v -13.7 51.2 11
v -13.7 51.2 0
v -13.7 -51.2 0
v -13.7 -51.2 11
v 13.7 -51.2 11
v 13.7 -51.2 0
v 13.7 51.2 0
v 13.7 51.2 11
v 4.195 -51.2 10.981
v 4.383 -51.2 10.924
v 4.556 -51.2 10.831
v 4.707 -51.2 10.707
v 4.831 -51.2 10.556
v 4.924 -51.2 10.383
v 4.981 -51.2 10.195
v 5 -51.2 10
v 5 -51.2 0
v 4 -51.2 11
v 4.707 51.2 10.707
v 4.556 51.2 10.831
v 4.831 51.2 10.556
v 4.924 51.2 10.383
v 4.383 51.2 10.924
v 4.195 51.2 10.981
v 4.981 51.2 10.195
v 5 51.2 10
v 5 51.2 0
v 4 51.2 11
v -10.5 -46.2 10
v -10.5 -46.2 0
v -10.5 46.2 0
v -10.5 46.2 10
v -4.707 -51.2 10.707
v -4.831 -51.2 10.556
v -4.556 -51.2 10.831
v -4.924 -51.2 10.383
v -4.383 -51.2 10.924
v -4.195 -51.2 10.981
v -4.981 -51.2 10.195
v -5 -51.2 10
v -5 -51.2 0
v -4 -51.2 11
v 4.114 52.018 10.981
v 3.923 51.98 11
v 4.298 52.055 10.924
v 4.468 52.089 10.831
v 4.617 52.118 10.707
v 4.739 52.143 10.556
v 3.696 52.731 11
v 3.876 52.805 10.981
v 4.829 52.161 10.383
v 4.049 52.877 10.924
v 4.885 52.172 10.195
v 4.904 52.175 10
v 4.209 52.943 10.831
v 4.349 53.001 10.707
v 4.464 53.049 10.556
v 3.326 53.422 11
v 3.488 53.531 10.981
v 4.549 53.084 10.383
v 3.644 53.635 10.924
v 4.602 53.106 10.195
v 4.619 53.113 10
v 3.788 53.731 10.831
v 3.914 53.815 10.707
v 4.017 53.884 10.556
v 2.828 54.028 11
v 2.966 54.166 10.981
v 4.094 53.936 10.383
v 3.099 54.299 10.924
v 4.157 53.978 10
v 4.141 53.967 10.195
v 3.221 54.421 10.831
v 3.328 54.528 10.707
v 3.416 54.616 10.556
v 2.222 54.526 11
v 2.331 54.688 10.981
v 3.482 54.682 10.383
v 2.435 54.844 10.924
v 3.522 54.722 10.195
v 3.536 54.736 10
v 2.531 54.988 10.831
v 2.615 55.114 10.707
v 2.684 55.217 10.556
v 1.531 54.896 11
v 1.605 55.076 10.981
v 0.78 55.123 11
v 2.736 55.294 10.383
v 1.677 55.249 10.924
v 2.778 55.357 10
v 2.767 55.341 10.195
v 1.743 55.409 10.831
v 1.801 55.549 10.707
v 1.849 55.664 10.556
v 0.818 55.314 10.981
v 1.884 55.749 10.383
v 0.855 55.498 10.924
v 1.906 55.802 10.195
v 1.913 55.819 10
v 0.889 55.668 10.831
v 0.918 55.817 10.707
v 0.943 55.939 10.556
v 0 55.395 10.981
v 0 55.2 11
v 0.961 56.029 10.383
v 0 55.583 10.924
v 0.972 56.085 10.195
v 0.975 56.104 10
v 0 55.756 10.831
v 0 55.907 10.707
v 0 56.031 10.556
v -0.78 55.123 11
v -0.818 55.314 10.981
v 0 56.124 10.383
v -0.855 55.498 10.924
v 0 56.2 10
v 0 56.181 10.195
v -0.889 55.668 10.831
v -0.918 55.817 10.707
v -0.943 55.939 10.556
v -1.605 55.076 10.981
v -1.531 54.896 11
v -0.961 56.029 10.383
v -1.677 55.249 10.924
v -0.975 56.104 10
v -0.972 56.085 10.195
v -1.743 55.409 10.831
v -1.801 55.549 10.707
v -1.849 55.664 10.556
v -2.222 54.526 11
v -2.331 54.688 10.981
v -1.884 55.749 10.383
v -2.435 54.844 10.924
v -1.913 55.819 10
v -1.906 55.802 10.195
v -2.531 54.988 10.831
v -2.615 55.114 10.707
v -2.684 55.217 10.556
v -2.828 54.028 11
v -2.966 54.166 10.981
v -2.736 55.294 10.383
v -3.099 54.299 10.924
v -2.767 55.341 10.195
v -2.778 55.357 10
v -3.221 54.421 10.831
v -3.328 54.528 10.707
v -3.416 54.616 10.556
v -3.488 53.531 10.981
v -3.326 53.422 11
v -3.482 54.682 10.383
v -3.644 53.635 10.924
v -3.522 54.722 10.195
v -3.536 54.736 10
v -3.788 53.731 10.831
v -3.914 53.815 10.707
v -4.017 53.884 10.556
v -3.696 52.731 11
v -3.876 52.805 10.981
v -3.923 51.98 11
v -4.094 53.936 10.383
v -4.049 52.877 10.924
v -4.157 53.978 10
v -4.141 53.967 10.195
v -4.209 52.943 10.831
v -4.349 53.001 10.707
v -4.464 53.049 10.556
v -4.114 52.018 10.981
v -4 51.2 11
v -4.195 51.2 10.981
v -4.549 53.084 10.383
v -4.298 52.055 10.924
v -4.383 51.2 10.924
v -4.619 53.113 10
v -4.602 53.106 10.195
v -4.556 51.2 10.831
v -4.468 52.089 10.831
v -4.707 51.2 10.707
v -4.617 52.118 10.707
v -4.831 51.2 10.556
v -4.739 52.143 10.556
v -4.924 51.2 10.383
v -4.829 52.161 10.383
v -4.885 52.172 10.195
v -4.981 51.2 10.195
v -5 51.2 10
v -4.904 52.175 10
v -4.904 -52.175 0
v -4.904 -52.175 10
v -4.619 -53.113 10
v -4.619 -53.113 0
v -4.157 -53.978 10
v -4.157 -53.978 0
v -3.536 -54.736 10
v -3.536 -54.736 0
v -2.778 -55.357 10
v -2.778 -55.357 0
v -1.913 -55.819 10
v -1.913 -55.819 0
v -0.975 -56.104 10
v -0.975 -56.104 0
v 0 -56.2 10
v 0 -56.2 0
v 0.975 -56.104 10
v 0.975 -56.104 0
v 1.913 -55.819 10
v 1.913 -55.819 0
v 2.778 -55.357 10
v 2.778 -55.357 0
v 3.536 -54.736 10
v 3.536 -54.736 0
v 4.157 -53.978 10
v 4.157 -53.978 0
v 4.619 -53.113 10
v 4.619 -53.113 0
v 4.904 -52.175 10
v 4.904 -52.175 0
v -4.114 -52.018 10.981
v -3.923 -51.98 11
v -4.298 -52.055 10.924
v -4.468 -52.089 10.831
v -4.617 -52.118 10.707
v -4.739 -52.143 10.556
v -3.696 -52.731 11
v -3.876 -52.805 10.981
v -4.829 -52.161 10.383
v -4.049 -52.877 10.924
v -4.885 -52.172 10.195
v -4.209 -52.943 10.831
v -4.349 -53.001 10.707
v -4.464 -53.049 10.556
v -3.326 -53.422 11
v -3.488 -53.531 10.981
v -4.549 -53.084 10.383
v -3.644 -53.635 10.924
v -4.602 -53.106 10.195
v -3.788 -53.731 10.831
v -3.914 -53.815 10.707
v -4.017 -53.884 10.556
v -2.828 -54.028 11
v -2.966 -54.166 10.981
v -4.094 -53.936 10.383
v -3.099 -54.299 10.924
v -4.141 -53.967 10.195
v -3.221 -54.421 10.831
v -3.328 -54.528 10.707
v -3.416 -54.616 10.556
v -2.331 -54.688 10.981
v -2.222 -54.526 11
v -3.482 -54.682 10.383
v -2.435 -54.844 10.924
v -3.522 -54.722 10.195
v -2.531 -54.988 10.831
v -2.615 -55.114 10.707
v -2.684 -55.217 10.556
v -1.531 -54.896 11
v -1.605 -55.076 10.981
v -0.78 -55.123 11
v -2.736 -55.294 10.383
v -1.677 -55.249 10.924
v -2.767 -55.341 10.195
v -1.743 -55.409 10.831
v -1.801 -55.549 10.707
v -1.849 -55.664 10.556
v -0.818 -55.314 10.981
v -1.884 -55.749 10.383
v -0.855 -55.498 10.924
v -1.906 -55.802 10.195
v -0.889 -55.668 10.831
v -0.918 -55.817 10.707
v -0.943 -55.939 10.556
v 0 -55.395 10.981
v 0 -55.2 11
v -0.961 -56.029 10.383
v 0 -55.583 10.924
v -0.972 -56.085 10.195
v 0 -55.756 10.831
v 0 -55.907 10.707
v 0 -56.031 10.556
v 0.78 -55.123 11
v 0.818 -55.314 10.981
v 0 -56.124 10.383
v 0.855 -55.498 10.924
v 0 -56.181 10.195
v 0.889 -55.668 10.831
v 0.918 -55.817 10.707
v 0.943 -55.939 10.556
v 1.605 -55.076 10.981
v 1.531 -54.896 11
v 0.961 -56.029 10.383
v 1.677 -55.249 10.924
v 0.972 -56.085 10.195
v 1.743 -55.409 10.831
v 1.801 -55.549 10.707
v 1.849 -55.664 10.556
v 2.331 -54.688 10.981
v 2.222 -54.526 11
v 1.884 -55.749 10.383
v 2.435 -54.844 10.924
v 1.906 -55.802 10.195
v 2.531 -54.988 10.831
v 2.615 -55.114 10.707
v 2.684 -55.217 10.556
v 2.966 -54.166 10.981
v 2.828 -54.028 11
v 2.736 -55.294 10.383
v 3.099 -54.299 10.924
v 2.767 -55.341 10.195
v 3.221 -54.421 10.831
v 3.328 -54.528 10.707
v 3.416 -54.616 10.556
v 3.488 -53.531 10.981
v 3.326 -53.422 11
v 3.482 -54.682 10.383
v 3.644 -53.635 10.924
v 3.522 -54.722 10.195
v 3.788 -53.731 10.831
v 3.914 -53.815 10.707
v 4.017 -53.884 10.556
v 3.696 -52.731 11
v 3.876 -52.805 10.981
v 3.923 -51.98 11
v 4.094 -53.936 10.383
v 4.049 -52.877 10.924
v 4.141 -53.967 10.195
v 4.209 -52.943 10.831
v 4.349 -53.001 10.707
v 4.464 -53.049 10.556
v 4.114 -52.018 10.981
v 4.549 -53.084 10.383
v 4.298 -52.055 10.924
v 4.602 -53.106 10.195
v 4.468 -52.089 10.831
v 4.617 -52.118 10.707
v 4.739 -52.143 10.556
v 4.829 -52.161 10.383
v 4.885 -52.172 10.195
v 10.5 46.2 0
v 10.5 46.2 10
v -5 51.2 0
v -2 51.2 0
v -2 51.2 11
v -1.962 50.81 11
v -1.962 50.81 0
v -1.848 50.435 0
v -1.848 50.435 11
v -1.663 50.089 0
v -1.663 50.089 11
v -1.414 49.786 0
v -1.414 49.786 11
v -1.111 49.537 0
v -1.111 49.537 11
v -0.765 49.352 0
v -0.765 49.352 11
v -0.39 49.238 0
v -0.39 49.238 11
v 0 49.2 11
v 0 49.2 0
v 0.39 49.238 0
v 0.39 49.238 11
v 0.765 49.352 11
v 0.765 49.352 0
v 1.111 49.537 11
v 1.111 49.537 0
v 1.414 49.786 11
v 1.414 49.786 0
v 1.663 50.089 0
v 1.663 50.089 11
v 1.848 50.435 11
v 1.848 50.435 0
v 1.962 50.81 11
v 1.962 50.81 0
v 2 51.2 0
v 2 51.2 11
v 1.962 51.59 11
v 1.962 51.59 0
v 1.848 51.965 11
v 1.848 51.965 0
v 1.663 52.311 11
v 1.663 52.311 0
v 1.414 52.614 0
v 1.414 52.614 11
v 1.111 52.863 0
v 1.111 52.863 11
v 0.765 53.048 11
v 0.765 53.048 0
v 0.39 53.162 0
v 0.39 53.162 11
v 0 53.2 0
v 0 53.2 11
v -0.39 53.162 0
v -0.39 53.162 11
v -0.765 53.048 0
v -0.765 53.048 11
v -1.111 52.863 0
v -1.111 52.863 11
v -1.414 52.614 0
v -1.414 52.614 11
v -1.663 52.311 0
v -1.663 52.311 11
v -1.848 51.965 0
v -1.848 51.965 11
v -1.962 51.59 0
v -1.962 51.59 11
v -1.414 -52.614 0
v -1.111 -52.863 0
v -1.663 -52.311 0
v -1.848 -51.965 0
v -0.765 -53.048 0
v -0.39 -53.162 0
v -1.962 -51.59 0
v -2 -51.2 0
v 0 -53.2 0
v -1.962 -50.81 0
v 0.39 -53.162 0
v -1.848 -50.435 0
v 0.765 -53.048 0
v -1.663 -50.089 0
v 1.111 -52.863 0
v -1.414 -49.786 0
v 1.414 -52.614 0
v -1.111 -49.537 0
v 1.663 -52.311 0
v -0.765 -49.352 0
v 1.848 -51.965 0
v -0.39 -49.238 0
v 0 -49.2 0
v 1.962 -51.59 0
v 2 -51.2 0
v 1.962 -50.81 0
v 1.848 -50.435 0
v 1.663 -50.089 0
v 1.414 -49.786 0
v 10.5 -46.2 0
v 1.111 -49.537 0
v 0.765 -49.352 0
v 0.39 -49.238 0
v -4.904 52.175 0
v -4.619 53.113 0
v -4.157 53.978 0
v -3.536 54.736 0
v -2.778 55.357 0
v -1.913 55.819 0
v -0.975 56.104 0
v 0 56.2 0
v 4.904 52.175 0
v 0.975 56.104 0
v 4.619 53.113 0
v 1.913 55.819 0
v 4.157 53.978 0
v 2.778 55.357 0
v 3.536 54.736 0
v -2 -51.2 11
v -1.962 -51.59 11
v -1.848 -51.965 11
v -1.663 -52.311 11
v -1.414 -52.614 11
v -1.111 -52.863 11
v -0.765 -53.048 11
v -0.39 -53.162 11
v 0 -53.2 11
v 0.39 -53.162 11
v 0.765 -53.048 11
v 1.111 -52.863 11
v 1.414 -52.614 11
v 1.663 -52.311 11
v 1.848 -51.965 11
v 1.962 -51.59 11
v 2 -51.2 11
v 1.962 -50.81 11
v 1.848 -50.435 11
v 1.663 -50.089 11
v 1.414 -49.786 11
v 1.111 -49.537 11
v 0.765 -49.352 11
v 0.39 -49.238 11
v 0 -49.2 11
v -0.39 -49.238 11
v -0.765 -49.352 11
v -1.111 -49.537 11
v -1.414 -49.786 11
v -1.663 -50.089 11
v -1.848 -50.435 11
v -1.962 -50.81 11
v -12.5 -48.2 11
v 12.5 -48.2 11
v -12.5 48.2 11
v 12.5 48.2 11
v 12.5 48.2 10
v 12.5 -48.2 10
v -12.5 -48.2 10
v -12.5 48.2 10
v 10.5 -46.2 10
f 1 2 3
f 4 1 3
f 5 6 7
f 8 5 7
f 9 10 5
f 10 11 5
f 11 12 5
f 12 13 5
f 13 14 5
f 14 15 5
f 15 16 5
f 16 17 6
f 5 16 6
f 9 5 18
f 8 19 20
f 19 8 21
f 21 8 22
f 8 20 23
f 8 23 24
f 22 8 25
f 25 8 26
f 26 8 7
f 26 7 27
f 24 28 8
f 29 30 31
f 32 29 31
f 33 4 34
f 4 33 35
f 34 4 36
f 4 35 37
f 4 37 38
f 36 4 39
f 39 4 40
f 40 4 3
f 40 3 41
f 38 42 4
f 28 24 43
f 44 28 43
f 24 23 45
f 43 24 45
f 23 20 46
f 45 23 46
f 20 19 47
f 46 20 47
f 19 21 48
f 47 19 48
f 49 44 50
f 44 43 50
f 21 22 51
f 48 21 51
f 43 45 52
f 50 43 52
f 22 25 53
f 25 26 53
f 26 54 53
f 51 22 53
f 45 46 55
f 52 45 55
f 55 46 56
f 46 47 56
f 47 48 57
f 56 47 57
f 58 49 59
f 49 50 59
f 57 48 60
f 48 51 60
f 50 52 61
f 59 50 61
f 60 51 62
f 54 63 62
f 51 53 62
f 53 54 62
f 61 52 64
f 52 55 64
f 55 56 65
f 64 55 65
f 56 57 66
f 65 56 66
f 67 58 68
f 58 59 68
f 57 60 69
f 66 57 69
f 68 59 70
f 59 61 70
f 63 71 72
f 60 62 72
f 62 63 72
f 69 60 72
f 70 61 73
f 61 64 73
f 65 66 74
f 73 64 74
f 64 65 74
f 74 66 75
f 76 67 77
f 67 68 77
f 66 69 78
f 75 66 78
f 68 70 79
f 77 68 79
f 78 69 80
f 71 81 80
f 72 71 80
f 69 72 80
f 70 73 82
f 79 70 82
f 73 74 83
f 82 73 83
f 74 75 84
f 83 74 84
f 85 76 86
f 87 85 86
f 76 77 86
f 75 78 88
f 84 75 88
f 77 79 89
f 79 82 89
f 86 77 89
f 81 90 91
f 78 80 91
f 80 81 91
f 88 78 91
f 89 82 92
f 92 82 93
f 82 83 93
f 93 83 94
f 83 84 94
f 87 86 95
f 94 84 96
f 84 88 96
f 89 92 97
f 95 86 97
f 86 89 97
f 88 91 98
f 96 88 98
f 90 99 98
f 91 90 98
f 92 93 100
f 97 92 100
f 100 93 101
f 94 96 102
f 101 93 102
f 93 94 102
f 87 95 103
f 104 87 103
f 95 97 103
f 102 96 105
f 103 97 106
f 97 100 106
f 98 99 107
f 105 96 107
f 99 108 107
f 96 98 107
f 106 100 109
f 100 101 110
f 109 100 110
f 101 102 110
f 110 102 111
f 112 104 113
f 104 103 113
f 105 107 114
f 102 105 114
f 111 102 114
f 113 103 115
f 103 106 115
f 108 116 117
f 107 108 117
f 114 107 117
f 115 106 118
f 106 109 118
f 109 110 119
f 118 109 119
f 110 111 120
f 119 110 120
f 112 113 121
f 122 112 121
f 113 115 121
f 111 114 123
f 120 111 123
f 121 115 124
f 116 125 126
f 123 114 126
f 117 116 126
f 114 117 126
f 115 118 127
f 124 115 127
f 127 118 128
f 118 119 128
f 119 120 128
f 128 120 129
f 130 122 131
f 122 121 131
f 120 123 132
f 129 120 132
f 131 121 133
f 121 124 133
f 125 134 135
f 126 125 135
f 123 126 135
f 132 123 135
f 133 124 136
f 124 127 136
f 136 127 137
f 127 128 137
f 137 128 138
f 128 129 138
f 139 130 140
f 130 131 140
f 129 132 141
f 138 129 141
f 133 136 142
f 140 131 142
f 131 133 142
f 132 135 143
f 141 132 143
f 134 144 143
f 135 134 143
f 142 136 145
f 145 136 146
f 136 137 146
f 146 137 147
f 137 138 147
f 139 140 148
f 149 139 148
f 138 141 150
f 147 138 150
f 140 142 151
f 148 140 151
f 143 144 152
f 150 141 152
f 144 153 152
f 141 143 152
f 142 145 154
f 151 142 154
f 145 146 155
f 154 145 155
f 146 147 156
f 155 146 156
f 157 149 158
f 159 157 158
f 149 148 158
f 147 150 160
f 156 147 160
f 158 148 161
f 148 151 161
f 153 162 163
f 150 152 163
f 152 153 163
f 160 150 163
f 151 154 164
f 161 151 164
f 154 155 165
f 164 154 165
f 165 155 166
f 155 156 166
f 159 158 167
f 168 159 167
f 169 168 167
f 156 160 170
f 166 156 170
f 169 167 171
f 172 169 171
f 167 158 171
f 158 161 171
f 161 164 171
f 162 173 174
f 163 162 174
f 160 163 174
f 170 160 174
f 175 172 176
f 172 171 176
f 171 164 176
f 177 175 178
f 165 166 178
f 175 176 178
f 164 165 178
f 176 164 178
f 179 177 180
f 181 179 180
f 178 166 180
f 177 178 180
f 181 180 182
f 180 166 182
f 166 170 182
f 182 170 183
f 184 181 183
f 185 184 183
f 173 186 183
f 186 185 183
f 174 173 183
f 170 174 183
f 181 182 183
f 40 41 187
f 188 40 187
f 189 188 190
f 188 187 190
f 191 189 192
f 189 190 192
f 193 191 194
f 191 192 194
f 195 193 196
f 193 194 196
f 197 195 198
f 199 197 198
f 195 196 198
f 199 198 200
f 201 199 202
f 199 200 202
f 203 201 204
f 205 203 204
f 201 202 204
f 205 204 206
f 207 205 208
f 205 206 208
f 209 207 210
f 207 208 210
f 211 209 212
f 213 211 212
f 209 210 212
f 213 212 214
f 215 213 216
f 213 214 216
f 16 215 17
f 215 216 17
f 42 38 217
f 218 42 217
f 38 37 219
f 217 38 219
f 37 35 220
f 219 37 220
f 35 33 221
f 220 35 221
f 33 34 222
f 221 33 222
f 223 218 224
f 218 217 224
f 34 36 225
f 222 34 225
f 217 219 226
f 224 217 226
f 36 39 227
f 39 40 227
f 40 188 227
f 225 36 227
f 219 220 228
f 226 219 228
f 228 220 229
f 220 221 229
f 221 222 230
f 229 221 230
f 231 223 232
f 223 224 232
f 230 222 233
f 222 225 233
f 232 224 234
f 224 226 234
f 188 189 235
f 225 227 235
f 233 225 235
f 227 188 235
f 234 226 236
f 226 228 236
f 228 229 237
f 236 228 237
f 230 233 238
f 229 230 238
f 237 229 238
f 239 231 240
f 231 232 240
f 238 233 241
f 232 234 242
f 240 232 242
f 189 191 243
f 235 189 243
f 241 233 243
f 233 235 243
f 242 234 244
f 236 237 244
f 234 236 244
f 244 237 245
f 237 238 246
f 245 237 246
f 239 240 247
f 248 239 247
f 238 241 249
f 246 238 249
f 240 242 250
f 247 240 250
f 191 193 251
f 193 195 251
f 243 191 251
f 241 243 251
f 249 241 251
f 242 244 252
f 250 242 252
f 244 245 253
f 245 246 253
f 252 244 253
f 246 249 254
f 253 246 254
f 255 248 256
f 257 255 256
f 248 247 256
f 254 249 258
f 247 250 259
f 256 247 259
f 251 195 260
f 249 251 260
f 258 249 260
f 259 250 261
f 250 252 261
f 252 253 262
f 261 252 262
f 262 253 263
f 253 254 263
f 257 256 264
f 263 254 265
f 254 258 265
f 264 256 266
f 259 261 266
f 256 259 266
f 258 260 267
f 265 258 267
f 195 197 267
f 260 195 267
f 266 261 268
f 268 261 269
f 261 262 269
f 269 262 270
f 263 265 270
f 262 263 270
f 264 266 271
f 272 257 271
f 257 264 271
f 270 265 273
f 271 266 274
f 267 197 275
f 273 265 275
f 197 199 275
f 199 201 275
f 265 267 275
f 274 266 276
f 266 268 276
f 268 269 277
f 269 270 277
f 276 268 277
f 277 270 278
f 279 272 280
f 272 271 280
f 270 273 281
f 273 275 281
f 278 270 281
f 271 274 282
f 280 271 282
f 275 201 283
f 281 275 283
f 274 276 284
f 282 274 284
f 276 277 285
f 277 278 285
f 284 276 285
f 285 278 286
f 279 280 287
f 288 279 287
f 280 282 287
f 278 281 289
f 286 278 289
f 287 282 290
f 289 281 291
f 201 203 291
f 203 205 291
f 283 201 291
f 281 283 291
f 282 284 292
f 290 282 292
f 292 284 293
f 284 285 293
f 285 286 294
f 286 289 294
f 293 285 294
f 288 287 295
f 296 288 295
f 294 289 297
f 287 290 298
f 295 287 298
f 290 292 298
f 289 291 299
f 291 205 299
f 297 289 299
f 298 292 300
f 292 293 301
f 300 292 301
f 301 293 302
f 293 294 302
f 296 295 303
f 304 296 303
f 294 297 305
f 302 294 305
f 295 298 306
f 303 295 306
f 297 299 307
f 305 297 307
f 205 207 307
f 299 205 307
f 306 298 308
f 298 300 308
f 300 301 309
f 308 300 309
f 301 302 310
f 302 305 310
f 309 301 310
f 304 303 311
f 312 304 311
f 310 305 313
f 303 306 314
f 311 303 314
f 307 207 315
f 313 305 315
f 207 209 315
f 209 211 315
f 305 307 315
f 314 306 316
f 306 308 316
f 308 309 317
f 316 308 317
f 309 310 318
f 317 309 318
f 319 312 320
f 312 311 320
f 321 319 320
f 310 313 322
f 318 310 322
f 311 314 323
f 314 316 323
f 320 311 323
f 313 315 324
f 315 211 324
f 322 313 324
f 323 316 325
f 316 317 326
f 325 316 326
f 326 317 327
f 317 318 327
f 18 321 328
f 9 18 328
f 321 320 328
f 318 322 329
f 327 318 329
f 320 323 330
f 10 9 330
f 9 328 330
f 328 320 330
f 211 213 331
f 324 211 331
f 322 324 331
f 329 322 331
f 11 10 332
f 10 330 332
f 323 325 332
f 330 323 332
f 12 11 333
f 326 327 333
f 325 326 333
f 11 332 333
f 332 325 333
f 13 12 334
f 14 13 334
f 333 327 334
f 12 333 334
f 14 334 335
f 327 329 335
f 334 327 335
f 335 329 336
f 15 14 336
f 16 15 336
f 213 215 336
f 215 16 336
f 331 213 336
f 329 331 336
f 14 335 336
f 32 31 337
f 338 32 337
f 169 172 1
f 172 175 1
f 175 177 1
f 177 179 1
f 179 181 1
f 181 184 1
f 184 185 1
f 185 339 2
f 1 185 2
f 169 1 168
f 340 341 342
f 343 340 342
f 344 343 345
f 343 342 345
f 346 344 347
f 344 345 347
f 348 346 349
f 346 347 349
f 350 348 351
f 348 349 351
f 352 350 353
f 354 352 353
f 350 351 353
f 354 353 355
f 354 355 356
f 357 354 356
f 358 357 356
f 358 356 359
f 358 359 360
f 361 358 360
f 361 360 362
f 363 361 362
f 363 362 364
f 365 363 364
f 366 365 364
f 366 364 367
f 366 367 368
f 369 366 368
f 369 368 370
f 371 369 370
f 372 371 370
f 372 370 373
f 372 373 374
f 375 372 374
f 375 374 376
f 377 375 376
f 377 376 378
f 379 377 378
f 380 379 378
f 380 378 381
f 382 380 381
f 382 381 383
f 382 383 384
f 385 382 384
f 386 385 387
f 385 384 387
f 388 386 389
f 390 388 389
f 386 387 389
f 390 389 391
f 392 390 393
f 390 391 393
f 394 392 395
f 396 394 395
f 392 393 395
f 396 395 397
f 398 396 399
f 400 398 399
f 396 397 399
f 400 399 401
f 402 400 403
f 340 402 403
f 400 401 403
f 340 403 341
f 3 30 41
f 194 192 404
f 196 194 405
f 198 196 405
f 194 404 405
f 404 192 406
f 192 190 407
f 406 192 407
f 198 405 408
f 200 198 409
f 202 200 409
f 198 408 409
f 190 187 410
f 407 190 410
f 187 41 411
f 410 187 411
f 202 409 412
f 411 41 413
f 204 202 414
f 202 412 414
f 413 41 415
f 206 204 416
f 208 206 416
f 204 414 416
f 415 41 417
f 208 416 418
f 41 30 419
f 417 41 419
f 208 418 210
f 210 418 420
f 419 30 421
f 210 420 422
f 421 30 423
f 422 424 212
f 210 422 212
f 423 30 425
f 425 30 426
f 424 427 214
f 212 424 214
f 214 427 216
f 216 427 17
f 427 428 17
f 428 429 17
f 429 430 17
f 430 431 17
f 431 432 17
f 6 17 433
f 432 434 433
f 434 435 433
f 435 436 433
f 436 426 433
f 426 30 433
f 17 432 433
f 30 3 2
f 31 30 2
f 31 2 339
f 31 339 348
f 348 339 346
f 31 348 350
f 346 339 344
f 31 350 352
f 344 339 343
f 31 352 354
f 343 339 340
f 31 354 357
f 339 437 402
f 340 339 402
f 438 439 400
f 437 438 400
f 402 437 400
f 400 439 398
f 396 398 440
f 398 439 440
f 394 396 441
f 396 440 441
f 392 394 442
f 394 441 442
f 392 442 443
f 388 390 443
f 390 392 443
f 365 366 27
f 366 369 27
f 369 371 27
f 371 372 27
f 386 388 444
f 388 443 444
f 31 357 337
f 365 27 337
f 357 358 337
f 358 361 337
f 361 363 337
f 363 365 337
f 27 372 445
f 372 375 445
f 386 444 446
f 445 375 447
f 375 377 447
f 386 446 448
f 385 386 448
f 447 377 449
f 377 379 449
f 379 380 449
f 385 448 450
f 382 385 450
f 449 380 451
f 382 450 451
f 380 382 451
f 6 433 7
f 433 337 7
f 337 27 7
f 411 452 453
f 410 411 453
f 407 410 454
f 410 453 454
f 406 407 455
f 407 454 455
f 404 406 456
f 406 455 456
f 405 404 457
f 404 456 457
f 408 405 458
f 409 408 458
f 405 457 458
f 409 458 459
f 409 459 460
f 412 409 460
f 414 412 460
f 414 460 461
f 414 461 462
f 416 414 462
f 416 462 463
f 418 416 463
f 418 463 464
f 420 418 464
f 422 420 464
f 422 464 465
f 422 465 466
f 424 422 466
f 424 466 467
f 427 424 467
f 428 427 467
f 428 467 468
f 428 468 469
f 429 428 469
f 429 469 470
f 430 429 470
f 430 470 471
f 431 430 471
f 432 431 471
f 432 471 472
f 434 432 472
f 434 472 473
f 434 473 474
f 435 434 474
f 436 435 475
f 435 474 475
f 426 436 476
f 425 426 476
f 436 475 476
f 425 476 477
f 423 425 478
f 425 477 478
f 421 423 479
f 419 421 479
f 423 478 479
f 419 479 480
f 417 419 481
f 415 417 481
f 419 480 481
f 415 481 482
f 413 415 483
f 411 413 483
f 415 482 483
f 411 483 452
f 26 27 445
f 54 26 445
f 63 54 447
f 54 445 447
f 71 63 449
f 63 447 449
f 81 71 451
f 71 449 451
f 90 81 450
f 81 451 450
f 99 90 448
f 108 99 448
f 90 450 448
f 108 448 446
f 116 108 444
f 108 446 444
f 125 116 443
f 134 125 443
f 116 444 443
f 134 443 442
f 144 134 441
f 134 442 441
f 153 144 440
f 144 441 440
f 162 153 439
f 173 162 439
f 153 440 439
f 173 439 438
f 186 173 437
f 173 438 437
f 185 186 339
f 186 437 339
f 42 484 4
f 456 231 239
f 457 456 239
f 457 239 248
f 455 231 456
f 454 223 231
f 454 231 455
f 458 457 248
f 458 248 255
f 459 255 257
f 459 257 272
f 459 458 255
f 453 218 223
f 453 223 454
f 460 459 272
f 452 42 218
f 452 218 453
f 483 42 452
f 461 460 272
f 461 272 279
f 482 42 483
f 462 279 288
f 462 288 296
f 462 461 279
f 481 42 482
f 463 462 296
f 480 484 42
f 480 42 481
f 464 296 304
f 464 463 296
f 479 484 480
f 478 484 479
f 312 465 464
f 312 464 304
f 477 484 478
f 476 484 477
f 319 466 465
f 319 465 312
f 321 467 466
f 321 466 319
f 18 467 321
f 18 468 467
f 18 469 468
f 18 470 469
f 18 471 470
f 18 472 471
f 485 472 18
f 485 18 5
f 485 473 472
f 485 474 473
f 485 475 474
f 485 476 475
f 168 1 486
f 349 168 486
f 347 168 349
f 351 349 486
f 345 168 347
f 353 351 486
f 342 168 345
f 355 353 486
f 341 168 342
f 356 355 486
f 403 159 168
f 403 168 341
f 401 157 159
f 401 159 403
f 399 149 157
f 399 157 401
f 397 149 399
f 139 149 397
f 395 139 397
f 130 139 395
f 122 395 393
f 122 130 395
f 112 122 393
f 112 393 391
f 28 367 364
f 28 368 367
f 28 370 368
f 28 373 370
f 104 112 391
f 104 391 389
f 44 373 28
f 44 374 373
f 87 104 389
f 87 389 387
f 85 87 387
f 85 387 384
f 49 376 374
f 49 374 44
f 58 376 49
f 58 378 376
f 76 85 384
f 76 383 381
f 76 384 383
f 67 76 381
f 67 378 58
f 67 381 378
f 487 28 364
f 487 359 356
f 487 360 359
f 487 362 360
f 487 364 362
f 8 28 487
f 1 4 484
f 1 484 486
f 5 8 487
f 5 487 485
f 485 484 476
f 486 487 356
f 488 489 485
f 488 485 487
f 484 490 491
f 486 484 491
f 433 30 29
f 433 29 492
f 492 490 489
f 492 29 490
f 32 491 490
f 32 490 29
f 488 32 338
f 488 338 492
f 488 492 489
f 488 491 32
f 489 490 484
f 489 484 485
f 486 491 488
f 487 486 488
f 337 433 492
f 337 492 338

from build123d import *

# Parameters (mm, degrees)
F0_W     = 25
F0_H     = 96.4
F0_W_2   = 21
F0_H_2   = 92.4
F1_DEPTH = 10
F2_DEPTH = 11
F3_D     = 4
F3_DEPTH = 15
F4_R     = 1


with BuildPart() as f1:
    # F0 (on Top) → F1 (new body)
    with BuildSketch(Plane.XY):
        Rectangle(F0_W, F0_H)
        Rectangle(F0_W_2, F0_H_2, mode=Mode.SUBTRACT)
    extrude(amount=F1_DEPTH)

    # F0 (on Top) → F2 (join)
    with BuildSketch(Plane.XY):
        Polygon((-5, 51.2), (-13.7, 51.2), (-13.7, -51.2), (-5, -51.2), (5, -51.2), (13.7, -51.2), (13.7, 51.2), (5, 51.2), align=None)
        Rectangle(F0_W, F0_H, mode=Mode.SUBTRACT)
        with BuildLine():
            Line((5, -51.2), (-5, -51.2))
            ThreePointArc((-5, -51.2), (0, -56.2), (5, -51.2))
        make_face()
        with BuildLine():
            ThreePointArc((5, 51.2), (0, 56.2), (-5, 51.2))
            Line((-5, 51.2), (5, 51.2))
        make_face()
    extrude(amount=F2_DEPTH)

    # F3
    with Locations(Plane(origin=(0, 0, 0), x_dir=(1, 0, 0), z_dir=(0, 0, -1))):
        with Locations((0, 51.2), (0, -51.2)):
            Hole(F3_D / 2, depth=F3_DEPTH)

    # F4
    f4_edges = [f1.edges().sort_by_distance(p)[0] for p in [
        (0, 56.2, 11),
        (0, -56.2, 11),
    ]]
    fillet(f4_edges, radius=F4_R)


solid = f1.part
